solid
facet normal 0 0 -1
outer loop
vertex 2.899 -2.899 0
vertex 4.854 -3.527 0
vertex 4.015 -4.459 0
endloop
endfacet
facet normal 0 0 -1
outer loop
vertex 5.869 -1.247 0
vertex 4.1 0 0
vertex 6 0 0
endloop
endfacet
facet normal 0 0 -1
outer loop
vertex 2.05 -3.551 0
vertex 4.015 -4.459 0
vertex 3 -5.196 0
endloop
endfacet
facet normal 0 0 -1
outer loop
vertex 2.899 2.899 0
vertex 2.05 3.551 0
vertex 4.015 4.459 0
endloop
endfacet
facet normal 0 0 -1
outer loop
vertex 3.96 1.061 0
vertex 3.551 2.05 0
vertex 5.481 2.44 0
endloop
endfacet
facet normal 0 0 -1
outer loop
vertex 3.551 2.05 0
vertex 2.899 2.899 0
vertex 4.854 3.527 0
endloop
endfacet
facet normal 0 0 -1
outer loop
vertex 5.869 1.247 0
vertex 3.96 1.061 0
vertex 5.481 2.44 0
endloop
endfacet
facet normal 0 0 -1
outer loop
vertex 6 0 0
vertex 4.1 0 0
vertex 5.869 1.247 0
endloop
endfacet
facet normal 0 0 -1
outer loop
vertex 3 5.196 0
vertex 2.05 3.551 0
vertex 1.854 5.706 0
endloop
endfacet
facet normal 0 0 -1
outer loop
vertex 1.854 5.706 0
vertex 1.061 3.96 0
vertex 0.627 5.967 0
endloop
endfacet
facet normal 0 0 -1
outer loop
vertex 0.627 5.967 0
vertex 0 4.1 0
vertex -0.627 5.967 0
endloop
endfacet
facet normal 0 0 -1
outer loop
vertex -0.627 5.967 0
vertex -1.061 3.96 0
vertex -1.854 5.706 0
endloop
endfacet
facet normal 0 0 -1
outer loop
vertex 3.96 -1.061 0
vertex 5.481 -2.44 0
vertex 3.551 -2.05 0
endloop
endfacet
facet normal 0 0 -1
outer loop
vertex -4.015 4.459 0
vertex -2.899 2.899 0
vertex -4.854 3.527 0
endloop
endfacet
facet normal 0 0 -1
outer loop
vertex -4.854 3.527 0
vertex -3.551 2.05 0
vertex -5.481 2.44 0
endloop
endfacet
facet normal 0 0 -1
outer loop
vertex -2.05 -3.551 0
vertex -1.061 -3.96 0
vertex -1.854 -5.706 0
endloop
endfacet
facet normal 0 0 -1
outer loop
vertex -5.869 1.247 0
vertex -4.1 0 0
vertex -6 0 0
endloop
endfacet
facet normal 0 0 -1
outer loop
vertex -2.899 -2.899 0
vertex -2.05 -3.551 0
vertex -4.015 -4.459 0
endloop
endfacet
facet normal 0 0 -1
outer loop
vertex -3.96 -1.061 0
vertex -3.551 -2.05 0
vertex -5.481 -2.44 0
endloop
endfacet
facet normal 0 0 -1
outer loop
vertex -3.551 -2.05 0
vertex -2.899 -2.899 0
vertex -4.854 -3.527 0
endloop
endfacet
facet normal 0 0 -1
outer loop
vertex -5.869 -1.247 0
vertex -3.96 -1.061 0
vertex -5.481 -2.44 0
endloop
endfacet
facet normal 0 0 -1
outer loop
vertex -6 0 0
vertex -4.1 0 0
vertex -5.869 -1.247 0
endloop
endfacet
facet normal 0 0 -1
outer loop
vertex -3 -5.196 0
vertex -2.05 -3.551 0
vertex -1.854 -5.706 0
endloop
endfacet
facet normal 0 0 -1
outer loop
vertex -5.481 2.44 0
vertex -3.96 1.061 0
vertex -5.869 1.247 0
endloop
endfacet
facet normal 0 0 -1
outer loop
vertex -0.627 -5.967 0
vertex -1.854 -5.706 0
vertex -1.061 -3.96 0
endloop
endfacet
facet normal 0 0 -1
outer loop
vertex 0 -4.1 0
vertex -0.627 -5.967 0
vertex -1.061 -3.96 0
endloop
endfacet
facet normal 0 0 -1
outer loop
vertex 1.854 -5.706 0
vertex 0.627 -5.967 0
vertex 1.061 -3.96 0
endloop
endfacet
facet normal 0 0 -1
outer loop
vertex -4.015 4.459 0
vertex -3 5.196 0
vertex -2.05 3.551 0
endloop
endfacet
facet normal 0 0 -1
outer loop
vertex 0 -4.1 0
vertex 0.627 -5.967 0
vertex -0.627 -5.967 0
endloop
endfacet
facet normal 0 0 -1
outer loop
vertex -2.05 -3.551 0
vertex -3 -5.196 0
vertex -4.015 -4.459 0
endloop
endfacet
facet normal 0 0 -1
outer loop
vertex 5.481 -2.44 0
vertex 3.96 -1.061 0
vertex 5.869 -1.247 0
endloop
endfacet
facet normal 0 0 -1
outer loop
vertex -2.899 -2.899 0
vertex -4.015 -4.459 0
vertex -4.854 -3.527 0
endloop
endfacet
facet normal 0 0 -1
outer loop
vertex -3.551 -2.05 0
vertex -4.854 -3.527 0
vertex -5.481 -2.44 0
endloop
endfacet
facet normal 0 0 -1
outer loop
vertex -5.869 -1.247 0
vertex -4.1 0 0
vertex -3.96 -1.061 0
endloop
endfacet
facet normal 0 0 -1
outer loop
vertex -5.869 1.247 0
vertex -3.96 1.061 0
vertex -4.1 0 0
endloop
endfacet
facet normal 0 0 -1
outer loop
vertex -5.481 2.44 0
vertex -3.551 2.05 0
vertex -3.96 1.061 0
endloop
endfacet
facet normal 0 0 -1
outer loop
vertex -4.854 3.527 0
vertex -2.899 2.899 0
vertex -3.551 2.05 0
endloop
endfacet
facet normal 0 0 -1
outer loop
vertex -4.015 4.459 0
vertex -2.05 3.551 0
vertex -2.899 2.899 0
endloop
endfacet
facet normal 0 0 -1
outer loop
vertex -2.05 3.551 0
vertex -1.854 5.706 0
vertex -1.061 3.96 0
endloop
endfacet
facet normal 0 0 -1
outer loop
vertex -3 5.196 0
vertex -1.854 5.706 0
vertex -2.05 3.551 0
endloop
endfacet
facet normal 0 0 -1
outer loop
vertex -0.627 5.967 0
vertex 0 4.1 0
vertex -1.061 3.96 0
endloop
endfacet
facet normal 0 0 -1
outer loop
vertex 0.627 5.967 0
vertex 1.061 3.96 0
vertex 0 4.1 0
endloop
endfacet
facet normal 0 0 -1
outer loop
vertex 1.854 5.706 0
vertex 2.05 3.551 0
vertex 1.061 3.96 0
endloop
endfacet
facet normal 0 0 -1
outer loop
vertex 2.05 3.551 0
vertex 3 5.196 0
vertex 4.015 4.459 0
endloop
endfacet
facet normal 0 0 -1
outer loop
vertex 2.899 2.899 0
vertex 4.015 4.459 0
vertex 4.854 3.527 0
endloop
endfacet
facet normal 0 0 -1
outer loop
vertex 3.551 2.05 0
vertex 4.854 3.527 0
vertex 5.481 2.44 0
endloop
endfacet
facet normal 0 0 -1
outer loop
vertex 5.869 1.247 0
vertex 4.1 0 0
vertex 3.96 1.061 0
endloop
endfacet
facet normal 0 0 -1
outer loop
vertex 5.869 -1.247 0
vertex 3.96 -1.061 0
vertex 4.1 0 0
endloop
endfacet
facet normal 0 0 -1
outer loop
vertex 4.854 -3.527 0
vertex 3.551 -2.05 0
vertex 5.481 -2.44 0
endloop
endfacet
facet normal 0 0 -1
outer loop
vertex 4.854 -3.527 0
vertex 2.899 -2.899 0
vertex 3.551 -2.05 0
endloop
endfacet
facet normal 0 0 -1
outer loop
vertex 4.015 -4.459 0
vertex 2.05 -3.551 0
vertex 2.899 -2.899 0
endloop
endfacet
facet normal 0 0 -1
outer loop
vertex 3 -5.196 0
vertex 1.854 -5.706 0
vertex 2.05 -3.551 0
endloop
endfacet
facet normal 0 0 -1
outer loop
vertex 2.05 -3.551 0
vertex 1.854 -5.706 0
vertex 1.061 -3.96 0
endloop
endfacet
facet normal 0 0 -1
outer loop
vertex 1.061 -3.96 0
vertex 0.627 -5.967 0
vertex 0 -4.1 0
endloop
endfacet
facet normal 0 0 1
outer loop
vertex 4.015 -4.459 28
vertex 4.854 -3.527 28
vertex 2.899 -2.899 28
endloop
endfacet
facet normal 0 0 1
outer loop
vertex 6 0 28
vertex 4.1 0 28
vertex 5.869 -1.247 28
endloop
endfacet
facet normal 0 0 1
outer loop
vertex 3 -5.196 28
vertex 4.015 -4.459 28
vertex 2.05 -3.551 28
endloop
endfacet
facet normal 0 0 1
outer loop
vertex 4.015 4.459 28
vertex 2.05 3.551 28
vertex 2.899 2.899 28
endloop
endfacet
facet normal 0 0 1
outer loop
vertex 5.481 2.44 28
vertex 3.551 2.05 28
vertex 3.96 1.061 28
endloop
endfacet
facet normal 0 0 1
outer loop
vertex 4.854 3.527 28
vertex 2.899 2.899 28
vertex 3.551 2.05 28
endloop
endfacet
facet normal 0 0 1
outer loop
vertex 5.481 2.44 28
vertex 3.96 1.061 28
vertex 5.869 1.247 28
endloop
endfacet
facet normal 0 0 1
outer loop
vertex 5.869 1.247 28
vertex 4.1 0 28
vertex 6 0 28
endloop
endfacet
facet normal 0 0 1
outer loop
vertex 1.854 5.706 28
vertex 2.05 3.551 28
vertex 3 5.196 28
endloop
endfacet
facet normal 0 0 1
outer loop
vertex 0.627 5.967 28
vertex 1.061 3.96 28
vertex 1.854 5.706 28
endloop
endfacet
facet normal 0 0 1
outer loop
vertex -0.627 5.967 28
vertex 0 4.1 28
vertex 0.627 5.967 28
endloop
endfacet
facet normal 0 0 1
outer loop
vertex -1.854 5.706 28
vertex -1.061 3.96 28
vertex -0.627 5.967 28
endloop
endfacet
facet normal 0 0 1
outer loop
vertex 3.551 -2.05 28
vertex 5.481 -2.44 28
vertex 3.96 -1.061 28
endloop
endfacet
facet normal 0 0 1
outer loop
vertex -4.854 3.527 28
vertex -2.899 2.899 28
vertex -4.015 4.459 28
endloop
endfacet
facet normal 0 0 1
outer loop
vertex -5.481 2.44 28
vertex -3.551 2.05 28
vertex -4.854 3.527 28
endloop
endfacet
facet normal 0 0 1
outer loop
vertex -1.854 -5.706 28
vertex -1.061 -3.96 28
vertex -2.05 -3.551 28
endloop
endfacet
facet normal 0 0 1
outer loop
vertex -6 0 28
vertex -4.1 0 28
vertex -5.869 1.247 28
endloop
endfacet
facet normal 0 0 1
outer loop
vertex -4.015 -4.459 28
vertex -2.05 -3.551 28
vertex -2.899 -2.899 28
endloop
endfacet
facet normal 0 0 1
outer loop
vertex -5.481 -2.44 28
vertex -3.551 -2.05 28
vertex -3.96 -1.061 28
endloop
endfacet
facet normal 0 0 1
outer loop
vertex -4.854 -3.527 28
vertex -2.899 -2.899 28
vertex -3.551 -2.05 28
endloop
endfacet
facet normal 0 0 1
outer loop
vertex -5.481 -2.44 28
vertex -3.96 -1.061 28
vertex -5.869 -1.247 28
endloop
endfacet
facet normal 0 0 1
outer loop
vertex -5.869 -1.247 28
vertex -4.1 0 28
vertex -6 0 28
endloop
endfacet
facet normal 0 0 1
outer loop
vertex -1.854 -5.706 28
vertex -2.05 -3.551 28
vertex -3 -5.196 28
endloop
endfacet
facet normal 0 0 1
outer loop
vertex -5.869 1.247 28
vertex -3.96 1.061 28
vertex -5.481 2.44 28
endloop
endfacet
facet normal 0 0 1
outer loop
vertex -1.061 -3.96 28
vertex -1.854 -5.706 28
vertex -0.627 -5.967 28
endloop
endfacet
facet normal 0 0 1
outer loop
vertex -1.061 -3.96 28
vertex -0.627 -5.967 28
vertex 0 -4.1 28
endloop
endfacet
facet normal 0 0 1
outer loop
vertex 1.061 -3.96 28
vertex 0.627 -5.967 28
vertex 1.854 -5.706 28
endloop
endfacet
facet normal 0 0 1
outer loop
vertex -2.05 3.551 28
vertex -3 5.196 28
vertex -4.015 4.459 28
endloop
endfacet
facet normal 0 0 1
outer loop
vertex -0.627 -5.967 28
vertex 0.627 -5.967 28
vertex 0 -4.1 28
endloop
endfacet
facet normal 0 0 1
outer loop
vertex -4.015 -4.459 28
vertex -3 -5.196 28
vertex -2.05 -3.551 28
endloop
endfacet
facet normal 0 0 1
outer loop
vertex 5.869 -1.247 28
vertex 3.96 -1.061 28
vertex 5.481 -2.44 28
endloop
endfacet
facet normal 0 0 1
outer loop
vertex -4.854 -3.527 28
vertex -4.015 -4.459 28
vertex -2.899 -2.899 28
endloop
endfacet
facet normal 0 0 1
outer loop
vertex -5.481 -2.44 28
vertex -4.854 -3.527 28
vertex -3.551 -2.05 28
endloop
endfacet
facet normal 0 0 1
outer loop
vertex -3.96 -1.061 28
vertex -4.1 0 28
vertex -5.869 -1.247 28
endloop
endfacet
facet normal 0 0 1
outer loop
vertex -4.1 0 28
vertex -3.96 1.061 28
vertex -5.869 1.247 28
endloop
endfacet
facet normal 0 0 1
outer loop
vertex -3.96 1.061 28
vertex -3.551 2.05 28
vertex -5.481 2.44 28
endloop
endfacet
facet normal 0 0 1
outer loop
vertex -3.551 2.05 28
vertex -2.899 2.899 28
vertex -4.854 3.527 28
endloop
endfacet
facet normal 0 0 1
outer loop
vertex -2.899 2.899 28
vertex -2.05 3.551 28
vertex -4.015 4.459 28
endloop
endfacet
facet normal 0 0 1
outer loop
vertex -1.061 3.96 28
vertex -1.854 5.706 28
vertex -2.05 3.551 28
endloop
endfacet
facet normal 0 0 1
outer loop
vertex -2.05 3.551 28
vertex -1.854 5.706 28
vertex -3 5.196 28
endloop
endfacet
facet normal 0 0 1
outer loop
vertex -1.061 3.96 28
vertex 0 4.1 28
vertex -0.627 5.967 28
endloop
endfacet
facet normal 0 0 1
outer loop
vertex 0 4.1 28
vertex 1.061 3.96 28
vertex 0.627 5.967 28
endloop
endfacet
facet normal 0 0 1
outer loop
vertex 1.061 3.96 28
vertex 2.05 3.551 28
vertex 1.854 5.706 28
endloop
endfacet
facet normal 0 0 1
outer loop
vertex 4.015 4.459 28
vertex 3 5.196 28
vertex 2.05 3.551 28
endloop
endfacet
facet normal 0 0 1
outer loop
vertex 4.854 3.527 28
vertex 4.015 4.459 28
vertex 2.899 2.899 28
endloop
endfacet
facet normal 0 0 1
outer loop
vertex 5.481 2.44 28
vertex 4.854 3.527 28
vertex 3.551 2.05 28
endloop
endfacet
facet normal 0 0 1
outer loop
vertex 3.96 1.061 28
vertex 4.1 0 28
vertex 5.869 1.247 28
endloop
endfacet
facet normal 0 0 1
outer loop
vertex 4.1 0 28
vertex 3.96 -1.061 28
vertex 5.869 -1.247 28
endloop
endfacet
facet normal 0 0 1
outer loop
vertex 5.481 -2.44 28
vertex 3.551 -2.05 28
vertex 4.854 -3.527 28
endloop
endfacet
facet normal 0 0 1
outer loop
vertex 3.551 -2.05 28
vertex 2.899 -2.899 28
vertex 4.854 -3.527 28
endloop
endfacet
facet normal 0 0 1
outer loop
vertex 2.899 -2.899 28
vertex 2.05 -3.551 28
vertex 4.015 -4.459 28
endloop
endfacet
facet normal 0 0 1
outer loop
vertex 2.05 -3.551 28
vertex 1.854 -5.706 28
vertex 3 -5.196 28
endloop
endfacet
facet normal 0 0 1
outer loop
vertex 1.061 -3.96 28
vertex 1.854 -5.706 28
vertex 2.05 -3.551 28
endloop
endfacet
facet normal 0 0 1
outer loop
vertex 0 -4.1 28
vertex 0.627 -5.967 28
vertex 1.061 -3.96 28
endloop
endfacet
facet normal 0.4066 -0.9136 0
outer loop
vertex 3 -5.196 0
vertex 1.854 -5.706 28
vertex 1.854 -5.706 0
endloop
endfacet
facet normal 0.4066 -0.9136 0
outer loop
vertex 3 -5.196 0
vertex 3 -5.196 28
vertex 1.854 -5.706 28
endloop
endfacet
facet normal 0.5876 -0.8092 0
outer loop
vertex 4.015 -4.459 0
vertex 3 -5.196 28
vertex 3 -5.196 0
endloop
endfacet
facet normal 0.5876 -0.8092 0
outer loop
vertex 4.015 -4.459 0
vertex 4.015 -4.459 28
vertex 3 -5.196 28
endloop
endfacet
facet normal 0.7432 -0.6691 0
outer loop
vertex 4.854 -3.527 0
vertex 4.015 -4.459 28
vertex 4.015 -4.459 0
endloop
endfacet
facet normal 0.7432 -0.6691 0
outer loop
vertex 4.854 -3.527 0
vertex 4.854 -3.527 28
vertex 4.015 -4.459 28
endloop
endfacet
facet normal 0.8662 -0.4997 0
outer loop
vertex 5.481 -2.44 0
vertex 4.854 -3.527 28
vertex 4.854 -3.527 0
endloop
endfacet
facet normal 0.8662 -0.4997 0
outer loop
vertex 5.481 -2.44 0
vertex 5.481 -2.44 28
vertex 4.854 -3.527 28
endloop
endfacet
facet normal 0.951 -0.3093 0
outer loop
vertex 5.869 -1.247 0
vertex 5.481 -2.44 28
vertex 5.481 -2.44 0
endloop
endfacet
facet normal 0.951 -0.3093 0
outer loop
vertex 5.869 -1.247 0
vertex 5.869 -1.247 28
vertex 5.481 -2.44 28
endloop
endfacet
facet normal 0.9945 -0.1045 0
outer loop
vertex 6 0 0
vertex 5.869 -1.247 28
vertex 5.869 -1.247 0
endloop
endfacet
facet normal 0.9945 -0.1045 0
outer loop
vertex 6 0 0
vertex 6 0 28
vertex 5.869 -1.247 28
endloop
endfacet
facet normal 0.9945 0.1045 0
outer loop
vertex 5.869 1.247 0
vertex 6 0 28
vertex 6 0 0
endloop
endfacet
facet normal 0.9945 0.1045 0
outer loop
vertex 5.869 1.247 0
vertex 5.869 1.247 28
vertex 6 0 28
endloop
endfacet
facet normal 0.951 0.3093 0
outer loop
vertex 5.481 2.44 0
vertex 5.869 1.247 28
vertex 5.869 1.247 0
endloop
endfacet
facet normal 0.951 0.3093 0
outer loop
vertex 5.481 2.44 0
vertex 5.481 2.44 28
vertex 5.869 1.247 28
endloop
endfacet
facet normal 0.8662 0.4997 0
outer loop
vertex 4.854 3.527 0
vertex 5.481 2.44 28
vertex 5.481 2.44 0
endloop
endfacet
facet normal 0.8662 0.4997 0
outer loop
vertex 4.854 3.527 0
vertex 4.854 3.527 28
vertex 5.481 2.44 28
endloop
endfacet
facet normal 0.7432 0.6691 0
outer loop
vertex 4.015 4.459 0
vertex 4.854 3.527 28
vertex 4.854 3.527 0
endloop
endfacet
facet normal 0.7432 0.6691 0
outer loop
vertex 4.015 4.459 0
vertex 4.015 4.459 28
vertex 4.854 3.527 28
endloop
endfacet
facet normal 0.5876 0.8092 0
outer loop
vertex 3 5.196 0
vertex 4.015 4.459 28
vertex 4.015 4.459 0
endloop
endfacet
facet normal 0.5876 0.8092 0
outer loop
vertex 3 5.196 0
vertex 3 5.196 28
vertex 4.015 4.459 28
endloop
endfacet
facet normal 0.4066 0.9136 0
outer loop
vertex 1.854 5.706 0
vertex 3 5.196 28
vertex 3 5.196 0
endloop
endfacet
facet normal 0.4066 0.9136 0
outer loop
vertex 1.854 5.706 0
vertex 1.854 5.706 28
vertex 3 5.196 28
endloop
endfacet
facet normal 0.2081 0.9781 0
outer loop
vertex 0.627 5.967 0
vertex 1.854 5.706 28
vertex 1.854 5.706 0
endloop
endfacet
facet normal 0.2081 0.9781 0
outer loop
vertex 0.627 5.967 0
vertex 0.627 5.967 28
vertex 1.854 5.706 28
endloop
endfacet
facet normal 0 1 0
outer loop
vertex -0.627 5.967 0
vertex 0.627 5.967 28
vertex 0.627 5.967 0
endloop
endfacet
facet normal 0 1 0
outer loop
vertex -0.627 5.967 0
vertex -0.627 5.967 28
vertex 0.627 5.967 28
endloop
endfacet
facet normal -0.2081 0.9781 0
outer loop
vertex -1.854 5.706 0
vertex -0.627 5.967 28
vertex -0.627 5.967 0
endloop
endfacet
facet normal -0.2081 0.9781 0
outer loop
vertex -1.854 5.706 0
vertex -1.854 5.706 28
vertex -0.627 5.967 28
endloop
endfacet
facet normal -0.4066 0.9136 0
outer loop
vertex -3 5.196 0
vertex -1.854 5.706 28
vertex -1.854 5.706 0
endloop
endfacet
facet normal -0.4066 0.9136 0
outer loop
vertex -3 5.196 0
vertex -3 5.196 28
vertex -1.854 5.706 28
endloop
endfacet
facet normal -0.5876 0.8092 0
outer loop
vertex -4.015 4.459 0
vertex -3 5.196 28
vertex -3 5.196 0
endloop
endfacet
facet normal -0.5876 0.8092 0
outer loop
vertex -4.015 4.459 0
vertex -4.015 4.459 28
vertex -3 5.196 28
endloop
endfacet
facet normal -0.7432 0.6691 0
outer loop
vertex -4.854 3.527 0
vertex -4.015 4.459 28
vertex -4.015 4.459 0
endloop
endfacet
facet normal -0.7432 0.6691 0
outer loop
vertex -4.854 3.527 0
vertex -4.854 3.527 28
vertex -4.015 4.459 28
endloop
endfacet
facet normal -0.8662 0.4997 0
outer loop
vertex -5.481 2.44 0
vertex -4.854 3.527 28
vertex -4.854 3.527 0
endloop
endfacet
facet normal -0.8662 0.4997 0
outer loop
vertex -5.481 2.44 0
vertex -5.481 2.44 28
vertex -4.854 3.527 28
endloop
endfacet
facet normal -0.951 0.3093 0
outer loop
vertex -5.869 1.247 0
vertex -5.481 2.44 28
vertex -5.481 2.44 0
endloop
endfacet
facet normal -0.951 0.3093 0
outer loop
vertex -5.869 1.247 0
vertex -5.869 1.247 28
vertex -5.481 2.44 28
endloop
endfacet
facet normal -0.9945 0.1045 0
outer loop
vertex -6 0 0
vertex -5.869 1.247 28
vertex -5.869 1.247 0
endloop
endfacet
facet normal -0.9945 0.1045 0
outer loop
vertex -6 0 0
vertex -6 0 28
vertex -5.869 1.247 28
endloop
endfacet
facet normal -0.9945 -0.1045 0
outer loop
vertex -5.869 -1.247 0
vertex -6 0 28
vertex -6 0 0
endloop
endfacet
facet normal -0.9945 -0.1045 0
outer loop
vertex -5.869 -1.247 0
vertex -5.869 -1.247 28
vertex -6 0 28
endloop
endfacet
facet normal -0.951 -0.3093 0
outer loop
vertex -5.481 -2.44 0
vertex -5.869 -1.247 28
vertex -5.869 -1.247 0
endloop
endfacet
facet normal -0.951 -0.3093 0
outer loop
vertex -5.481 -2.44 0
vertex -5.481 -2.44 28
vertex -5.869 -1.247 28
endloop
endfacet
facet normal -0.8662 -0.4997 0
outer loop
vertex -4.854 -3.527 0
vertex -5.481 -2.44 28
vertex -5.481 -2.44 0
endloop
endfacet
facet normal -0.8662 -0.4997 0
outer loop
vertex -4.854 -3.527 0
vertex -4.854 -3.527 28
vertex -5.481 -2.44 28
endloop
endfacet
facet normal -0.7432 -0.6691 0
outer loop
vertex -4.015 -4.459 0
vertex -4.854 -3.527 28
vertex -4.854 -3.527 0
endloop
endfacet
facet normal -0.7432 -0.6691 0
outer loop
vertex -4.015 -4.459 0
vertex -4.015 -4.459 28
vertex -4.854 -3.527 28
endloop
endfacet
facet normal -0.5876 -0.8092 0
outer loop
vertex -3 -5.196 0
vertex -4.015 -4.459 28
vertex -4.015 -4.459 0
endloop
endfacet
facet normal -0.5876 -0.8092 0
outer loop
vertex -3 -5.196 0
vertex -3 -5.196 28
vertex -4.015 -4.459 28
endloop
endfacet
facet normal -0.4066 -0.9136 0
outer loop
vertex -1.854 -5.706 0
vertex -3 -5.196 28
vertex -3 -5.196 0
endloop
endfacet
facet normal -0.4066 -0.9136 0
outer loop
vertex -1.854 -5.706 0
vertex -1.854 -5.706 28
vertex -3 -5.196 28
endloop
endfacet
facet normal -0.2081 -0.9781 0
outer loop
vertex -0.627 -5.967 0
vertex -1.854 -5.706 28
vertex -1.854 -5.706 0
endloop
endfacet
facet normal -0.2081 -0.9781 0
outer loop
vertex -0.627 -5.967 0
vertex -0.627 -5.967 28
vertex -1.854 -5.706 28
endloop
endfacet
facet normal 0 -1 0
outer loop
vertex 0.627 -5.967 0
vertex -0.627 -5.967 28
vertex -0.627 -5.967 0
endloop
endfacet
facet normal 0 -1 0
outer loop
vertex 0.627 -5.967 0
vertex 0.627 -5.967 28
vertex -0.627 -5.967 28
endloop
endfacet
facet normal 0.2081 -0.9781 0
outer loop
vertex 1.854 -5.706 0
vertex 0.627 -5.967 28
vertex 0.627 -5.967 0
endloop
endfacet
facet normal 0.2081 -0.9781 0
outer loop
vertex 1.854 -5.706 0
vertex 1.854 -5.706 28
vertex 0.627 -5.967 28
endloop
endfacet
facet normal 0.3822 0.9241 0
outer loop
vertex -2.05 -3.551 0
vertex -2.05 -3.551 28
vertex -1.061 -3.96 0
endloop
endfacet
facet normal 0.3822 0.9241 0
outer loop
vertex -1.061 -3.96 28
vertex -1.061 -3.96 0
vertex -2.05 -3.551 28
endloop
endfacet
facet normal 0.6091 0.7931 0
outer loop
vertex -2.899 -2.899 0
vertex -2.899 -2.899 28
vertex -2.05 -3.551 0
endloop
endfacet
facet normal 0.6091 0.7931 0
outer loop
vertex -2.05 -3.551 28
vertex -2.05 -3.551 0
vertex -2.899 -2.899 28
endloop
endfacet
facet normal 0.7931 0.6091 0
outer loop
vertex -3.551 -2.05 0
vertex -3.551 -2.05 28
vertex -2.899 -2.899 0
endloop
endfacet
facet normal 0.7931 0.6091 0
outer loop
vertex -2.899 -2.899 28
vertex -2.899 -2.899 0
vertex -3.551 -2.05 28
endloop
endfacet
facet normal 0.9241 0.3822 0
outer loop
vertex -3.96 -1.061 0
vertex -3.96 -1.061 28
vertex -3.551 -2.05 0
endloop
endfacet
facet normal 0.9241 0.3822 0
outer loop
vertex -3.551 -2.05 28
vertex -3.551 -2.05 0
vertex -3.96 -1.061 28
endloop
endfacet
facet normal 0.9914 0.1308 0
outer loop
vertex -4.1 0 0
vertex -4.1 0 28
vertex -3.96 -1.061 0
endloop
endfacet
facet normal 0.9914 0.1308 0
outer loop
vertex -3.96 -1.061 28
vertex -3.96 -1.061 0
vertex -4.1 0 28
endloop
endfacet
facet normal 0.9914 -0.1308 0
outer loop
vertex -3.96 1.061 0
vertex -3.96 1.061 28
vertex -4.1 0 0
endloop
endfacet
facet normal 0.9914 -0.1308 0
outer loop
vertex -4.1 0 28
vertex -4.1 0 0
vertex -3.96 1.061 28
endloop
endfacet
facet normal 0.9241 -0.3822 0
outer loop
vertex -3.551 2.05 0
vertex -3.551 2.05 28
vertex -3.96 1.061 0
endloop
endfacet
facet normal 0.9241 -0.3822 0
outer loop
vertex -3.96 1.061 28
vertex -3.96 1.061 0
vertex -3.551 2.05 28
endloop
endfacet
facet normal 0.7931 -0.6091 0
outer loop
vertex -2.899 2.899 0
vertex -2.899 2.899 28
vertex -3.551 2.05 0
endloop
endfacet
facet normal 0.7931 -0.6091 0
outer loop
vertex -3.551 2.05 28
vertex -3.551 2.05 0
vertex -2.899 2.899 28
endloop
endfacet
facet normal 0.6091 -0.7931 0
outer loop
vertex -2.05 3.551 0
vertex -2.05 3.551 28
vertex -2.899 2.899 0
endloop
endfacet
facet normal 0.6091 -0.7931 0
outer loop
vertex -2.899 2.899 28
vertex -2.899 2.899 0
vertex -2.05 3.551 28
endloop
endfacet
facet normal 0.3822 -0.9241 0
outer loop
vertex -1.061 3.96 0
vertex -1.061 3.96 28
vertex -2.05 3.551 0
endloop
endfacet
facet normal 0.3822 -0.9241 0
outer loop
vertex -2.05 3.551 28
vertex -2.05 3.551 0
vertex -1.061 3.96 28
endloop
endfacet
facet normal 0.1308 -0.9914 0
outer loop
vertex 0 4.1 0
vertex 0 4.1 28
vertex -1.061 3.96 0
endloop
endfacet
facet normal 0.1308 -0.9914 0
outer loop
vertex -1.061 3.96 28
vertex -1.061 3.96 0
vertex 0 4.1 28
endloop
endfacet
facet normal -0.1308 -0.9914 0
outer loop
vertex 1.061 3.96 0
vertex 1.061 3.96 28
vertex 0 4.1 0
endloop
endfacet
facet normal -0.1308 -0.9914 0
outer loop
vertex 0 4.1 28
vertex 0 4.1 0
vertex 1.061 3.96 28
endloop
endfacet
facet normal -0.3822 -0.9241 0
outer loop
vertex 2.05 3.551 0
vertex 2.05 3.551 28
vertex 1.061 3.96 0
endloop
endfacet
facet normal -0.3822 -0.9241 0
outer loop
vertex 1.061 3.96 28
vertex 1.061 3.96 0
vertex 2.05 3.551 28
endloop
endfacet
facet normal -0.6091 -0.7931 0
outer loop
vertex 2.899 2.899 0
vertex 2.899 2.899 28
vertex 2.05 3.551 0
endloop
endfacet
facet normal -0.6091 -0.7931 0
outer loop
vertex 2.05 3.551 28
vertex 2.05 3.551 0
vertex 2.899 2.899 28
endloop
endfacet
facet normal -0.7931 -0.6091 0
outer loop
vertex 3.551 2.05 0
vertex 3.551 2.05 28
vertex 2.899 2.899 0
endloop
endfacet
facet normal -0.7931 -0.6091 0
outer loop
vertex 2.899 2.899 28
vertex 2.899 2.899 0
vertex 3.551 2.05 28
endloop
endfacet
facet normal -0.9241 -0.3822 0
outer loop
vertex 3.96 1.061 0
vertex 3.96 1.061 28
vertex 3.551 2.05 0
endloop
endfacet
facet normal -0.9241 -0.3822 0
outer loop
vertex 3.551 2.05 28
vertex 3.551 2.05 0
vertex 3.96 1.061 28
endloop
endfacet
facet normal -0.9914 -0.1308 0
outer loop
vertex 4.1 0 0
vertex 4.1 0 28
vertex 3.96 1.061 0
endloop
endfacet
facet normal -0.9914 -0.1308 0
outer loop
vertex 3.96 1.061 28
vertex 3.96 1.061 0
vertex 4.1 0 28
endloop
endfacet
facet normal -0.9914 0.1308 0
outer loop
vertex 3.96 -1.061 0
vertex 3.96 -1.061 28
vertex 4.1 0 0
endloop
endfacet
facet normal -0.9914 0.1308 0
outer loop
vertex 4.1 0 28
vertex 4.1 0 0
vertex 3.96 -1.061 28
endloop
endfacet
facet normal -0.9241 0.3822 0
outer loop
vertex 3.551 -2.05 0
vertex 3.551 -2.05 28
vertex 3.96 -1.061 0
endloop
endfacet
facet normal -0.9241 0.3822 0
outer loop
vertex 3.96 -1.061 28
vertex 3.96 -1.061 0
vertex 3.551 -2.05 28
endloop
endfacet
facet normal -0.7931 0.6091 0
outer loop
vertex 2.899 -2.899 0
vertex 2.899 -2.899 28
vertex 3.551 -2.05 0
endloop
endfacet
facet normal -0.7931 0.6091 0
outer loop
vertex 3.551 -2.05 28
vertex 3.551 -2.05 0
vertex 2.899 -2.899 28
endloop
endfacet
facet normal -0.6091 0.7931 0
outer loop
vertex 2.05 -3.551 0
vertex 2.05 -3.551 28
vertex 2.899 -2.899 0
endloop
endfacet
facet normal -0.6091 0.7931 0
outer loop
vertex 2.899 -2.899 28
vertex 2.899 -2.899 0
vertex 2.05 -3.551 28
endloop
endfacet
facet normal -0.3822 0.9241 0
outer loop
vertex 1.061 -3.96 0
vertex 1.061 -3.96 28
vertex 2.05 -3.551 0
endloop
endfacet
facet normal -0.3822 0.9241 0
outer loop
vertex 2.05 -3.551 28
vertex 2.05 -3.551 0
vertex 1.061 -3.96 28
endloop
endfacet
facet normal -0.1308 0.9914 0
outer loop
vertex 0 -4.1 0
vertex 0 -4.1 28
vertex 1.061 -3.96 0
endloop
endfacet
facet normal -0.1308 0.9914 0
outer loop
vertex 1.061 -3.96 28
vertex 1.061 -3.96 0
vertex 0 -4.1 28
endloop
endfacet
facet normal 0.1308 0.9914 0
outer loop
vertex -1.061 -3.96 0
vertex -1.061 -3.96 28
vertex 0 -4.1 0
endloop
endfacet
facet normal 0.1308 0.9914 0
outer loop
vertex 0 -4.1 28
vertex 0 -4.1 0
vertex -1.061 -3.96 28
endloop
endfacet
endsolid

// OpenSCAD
linear_extrude(28) difference() { circle(d=12,$fn=30); circle(d=8.2,$fn=24); }
